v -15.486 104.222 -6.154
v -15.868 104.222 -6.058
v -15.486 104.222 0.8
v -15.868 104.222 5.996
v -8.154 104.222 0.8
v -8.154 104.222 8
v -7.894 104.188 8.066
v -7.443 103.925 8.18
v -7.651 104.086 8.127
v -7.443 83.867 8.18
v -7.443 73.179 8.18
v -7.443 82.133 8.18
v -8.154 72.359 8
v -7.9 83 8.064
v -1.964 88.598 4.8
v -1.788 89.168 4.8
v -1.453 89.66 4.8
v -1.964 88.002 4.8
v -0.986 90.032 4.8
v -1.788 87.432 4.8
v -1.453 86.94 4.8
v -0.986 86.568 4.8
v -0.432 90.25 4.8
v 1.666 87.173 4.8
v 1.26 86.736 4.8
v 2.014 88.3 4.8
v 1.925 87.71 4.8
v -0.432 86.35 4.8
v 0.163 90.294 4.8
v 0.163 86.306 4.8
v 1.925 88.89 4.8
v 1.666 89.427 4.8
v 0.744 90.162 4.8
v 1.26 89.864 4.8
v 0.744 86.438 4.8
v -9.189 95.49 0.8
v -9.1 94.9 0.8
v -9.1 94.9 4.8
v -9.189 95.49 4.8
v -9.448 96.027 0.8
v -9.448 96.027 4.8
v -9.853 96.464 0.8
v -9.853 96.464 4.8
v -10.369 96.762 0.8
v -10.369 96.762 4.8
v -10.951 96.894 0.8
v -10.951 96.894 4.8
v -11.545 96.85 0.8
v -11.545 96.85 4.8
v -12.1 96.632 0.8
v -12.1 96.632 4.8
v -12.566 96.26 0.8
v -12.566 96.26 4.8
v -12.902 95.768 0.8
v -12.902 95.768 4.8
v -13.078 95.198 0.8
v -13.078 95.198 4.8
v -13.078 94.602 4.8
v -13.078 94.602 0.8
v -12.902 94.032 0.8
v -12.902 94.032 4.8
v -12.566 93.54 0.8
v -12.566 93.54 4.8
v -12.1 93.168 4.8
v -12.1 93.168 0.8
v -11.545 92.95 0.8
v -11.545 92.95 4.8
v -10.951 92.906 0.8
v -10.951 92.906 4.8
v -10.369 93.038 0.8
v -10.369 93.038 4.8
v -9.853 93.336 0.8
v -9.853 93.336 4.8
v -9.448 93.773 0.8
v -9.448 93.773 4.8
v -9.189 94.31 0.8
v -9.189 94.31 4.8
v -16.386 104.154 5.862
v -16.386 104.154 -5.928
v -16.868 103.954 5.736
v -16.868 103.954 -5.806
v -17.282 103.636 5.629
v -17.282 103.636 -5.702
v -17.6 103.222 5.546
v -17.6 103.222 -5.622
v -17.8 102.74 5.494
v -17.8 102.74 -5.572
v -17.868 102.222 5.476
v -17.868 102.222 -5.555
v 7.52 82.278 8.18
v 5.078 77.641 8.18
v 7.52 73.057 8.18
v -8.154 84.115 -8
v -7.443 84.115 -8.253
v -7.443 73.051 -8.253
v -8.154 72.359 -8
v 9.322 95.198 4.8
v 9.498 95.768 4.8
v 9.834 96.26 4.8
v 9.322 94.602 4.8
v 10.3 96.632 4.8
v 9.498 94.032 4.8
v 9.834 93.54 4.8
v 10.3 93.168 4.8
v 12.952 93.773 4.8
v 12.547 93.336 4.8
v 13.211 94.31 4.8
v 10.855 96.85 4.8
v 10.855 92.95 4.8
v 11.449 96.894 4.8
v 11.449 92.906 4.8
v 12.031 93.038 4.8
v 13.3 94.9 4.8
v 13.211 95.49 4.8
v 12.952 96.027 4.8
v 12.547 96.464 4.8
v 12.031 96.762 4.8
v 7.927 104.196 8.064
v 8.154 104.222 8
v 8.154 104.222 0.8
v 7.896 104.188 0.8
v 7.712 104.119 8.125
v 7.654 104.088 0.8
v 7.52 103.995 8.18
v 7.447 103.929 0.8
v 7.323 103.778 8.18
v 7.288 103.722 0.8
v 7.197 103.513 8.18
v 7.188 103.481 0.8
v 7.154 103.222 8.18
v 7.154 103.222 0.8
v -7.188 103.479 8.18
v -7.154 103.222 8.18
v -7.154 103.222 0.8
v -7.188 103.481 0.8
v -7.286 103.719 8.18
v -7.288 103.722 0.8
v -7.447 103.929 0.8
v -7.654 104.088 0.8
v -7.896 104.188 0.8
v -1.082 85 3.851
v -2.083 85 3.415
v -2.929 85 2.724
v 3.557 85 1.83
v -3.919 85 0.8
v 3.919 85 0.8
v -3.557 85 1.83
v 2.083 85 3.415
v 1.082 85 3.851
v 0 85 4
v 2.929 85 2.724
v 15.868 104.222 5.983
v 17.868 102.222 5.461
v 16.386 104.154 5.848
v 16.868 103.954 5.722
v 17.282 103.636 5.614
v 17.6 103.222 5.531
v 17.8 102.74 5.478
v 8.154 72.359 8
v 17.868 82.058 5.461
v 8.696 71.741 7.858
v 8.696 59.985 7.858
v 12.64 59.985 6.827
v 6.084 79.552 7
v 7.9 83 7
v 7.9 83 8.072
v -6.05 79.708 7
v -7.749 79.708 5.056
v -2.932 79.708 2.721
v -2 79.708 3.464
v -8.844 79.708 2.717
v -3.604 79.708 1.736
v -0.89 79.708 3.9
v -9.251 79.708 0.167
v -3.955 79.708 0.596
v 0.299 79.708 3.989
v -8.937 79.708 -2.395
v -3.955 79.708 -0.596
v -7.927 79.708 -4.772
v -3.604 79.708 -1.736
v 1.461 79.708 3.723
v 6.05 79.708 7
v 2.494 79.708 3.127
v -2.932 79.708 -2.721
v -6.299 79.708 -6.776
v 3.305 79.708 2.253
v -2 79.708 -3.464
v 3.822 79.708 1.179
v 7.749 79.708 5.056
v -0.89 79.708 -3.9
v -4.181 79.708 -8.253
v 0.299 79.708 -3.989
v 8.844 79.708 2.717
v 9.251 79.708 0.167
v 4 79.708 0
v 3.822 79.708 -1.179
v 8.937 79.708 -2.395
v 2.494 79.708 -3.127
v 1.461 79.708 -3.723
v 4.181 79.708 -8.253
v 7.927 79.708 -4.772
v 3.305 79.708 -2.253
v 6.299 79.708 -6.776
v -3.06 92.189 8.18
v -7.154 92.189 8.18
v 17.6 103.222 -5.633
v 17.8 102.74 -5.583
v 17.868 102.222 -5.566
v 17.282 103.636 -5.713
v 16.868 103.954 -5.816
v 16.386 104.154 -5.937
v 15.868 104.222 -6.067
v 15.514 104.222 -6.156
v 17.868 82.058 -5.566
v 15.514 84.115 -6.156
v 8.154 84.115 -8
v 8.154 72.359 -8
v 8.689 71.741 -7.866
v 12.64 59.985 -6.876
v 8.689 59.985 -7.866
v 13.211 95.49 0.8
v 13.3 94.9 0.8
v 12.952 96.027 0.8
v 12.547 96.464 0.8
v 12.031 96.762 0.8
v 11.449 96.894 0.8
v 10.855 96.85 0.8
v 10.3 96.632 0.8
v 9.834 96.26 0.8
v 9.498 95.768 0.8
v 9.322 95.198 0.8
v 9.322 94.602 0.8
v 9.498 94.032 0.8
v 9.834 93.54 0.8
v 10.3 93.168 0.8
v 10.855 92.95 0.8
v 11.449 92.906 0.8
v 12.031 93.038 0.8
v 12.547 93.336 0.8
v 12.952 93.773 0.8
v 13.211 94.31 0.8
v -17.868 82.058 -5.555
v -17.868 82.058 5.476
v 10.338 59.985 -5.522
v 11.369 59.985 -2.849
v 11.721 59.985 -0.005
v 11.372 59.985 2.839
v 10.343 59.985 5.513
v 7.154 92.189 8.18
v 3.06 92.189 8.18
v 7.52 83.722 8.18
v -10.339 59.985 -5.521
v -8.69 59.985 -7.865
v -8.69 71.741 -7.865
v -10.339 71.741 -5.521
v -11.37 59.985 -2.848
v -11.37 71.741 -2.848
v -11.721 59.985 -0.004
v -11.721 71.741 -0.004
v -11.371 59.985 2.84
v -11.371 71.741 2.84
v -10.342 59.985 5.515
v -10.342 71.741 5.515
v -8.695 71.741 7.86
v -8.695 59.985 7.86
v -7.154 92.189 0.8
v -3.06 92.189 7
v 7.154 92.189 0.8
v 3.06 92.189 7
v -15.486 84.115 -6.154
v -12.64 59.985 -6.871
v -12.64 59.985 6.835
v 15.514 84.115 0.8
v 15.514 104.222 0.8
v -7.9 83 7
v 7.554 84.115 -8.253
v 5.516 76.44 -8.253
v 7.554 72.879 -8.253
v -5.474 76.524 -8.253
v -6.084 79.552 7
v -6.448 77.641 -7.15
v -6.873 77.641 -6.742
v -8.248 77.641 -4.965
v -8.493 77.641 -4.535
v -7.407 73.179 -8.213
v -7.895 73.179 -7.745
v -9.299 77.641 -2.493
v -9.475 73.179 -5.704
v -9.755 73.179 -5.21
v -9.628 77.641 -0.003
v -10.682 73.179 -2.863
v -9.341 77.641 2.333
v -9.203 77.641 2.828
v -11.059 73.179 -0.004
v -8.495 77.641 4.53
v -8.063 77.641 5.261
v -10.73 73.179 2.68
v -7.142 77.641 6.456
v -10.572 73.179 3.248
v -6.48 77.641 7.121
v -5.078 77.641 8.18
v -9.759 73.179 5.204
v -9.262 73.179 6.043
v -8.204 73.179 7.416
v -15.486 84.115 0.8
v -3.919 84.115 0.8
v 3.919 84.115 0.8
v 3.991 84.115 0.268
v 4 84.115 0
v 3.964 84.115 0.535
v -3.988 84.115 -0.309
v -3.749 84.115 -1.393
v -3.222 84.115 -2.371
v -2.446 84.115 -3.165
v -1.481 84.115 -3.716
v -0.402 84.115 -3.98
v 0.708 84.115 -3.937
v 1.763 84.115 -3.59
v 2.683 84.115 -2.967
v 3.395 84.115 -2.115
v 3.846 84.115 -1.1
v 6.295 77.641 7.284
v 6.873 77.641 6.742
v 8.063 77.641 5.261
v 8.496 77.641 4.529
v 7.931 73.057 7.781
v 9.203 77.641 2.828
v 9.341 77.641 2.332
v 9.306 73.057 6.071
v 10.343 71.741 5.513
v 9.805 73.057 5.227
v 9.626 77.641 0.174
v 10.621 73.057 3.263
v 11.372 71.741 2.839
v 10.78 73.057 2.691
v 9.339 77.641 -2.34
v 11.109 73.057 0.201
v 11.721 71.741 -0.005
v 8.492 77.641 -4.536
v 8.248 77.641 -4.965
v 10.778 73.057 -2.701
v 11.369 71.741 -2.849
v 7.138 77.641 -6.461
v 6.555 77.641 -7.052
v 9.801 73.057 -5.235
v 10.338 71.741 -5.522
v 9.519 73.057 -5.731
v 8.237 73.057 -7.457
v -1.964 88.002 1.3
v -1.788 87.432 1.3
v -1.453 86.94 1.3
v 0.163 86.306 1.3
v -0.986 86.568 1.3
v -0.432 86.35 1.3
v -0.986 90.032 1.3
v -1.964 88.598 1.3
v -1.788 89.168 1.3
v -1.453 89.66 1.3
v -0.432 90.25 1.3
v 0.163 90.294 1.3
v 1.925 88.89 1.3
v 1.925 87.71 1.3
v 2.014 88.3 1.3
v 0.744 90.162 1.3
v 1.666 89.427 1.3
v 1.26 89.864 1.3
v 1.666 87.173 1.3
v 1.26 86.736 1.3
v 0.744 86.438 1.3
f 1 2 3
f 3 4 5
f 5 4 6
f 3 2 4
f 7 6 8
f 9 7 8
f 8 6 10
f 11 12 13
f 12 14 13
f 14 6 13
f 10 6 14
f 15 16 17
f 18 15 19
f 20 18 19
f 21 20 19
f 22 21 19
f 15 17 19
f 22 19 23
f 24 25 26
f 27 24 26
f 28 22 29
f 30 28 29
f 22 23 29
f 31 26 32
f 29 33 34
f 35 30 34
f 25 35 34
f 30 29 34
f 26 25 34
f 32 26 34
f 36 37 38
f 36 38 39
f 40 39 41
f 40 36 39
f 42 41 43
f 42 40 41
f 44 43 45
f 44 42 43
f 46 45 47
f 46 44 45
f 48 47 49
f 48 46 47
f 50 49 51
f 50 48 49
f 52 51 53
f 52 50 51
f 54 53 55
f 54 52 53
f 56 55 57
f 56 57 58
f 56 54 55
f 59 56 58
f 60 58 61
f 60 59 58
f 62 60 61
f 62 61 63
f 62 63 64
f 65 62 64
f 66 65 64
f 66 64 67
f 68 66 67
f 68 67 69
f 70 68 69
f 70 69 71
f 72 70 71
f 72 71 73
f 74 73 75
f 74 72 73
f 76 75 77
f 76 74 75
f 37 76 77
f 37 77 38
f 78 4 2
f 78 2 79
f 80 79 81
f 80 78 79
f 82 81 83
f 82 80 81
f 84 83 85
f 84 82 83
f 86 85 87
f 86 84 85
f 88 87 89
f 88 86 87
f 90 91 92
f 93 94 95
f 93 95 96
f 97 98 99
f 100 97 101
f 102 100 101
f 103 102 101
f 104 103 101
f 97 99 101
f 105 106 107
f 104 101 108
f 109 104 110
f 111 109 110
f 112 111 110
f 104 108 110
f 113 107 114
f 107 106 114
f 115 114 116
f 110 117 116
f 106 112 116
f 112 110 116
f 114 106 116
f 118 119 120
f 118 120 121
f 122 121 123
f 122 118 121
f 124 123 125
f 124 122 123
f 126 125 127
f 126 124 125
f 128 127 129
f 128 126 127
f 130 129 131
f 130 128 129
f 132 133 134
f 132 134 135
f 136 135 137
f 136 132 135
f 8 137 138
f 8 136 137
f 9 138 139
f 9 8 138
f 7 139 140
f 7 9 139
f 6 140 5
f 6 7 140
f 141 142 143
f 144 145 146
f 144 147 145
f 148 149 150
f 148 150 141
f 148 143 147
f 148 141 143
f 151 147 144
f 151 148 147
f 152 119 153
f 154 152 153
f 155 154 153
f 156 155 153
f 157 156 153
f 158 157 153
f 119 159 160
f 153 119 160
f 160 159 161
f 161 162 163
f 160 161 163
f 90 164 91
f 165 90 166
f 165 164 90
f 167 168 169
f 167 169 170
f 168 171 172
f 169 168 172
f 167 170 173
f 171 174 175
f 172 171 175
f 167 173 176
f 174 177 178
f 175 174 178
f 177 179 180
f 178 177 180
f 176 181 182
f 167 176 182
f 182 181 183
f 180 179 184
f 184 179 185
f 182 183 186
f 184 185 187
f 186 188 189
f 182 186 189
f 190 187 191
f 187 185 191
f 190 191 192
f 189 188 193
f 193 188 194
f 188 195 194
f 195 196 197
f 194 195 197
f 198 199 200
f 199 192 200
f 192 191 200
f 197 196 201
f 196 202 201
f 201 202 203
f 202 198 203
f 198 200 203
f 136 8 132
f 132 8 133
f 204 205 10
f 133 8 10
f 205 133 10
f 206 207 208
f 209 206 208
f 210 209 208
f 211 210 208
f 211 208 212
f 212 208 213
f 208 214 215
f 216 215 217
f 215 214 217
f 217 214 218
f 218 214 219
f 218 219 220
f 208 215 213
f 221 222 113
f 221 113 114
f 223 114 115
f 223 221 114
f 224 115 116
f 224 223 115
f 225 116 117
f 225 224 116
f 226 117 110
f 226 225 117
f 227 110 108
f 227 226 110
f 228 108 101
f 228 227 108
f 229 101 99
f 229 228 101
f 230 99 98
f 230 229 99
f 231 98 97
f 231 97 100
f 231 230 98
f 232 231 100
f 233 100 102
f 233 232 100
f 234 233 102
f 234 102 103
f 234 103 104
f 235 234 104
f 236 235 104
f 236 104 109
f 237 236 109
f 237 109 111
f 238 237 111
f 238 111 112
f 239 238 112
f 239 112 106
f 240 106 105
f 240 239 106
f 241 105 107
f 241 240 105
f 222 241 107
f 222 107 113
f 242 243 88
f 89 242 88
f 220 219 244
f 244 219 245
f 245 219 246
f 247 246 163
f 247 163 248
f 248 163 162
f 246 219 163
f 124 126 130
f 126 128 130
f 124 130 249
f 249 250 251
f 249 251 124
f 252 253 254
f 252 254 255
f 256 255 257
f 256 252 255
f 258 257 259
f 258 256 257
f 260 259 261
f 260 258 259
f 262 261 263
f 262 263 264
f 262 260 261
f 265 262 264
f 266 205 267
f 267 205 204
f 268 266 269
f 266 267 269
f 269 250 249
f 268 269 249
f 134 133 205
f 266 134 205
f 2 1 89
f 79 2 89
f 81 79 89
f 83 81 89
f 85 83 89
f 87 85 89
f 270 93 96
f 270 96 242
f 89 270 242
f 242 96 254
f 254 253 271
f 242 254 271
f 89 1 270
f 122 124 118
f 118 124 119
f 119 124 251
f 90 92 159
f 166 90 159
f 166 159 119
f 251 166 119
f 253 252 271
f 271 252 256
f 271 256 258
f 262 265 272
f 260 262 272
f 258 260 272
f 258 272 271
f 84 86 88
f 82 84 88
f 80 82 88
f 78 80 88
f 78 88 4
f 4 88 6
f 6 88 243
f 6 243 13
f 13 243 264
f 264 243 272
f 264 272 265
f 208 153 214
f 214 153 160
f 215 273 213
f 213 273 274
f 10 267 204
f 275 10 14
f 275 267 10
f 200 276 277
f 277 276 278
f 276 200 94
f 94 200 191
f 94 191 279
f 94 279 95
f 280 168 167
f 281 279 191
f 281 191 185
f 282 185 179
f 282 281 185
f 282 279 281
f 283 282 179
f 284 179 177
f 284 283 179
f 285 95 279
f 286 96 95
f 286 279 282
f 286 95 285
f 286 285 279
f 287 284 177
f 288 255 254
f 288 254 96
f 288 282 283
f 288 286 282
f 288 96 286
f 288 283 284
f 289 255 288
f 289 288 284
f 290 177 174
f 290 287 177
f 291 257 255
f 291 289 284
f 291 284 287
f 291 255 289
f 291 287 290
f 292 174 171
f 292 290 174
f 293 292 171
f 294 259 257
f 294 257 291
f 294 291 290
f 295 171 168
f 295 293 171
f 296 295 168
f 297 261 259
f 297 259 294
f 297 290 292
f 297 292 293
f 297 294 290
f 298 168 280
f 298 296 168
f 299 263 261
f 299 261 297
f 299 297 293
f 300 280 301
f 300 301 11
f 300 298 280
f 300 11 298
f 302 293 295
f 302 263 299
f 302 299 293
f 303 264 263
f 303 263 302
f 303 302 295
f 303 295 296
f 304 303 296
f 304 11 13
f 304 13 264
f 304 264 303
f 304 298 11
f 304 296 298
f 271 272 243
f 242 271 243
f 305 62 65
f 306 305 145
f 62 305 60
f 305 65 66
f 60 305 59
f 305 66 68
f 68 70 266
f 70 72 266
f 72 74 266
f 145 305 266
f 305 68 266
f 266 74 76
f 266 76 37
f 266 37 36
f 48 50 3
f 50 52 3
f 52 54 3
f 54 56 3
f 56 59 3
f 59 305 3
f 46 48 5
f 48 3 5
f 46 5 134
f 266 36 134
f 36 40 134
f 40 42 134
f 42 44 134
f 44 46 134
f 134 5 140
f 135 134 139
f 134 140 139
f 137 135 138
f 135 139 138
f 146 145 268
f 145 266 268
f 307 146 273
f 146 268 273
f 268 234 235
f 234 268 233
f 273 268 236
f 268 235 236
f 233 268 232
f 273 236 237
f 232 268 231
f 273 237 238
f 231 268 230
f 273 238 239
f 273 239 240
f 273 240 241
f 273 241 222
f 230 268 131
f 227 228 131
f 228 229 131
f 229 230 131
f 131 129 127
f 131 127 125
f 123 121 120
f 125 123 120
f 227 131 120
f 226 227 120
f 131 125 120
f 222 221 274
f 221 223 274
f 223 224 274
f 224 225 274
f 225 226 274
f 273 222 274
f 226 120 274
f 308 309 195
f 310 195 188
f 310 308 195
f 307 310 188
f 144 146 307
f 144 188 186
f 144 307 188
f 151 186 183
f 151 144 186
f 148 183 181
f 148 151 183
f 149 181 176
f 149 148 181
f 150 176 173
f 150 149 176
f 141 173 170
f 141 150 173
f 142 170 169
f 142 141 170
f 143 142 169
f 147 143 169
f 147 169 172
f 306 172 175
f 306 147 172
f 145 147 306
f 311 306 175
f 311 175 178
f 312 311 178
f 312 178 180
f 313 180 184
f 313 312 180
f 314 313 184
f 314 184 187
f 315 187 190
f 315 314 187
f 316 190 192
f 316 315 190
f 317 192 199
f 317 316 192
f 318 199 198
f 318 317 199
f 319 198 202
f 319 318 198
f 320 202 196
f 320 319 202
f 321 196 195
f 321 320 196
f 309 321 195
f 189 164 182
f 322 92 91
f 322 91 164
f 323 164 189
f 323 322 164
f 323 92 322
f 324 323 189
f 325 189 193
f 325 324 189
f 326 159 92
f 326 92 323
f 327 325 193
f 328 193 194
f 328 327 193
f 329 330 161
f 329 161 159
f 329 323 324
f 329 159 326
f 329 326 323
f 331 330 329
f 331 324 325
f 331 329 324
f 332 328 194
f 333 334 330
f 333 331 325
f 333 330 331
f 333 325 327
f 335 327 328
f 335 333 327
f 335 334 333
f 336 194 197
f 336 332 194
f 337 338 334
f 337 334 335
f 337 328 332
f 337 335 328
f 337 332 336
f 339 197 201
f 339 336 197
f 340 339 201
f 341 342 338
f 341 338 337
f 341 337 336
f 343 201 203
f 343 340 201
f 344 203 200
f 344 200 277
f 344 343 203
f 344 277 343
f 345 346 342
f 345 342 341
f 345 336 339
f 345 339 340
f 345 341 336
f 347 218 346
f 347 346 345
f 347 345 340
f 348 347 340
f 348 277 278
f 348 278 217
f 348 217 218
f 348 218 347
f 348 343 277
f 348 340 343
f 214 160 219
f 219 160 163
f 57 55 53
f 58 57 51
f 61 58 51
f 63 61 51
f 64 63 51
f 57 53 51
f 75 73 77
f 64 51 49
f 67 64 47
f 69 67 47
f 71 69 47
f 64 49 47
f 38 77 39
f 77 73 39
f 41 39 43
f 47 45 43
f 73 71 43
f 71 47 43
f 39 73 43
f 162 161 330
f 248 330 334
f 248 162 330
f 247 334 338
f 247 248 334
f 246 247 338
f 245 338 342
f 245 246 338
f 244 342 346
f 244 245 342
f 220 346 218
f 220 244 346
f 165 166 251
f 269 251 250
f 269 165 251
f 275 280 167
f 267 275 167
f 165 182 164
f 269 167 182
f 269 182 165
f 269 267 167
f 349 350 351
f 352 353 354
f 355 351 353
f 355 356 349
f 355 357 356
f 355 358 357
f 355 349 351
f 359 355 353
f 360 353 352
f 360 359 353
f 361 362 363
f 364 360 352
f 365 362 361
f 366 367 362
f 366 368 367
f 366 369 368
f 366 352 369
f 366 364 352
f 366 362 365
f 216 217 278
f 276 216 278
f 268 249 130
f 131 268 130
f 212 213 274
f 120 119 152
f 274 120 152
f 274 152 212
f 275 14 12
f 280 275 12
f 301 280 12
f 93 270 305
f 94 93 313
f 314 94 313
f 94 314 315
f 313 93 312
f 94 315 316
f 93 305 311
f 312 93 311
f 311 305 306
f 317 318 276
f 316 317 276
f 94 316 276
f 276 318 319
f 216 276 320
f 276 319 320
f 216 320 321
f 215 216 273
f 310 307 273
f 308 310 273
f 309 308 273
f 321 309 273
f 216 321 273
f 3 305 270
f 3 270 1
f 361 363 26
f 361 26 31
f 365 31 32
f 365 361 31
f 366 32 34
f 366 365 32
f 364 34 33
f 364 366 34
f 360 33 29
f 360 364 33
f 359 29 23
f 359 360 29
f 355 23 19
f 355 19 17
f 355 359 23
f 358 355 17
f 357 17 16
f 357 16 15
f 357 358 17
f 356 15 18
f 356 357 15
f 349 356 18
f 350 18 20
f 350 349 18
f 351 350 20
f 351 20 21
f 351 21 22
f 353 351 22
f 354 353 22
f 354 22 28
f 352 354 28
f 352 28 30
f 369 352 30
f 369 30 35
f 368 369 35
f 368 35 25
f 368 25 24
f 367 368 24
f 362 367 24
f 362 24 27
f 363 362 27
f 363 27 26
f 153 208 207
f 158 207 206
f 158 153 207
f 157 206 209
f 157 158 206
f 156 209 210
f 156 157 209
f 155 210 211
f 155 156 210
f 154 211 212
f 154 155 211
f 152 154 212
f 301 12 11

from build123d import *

# Parameters (mm, degrees)
PAD_DEPTH       = 12
POCKET_DEPTH    = 62
SKETCH019_W     = 31
SKETCH019_H     = 21.780884
POCKET002_DEPTH = 17
SKETCH020_R     = 2
POCKET003_DEPTH = 4
CYLINDER_R      = 4
CYLINDER_DEPTH  = 28
POCKET032_DEPTH = 5
SKETCH084_W     = 7.885986
SKETCH084_H     = 7.189331
PAD020_DEPTH    = 0.5


with BuildPart() as part:
    # Sketch010 → Pad (new body, symmetric)
    with BuildSketch(Plane.XY):
        with BuildLine():
            Line((12.639868, 59.984547), (-12.639868, 59.984547))
            Line((-12.639868, 59.984547), (-17.867889, 82.058411))
            Line((-17.867889, 82.058411), (-17.867889, 102.222236))
            ThreePointArc((-15.867889, 104.222236), (-17.282103, 103.63645), (-17.867889, 102.222236))
            Line((-15.867889, 104.222236), (-8.154342, 104.222236))
            ThreePointArc((-7.154342, 103.222236), (-7.447235, 103.929343), (-8.154342, 104.222236))
            Line((-7.154342, 103.222236), (-7.154342, 92.189331))
            Line((-7.154342, 92.189331), (7.154342, 92.189331))
            Line((7.154342, 92.189331), (7.154342, 103.222236))
            ThreePointArc((8.154342, 104.222236), (7.447235, 103.929343), (7.154342, 103.222236))
            Line((8.154342, 104.222236), (15.867889, 104.222236))
            ThreePointArc((17.867889, 102.222236), (17.282103, 103.63645), (15.867889, 104.222236))
            Line((17.867889, 102.222236), (17.867889, 82.058411))
            Line((17.867889, 82.058411), (12.639868, 59.984547))
        make_face()
    extrude(amount=PAD_DEPTH, both=True)

    # Sketch011 → Pocket (cut)
    with BuildSketch(Plane.XZ.offset(-54)):
        Polygon((0, 13.813917), (-22.117895, 13.813917), (-22.117895, -0.189388), (-22.117895, -17.743416), (0, -17.743416), (22.658901, -17.743416), (22.658901, -0.111897), (22.658901, 13.813917), align=None)
        Polygon((-18.596464, 0), (-18.596464, 5.287208), (-8.154342, 8), (-7.443202, 8.179805), (0, 8.179805), (7.519913, 8.179805), (8.154342, 8), (18.531284, 5.287208), (18.531284, -0.112287), (18.531284, -5.399495), (8.154342, -8), (7.554242, -8.253323), (0.11104, -8.253323), (-7.443202, -8.253323), (-8.154342, -8), (-18.596464, -5.371119), align=None, mode=Mode.SUBTRACT)
    extrude(amount=-POCKET_DEPTH, mode=Mode.SUBTRACT)

    # Sketch019 → Pocket002 (cut)
    with BuildSketch(Plane.XY.offset(0.8)):
        with Locations((0.01352, 95.005211)):
            Rectangle(SKETCH019_W, SKETCH019_H)
    extrude(amount=-POCKET002_DEPTH, mode=Mode.SUBTRACT)

    # Sketch020 → Pocket003 (cut)
    with BuildSketch(Plane.XY.offset(0.8)):
        with Locations((-11.1, 94.9)):
            Circle(SKETCH020_R)
        with Locations((11.3, 94.9)):
            Circle(SKETCH020_R)
        with Locations((0.013518, 88.3)):
            Circle(SKETCH020_R)
    extrude(amount=POCKET003_DEPTH, mode=Mode.SUBTRACT)

    # Cylinder → Cylinder (cut)
    with BuildSketch(Plane.XZ.offset(-85)):
        Circle(CYLINDER_R)
    extrude(amount=CYLINDER_DEPTH, mode=Mode.SUBTRACT)

    # Sketch067 → Pocket032 (cut)
    with BuildSketch(Plane.XY.offset(7)):
        Polygon((-7.9, 83), (0, 68), (7.9, 83), (0, 98), align=None)
    extrude(amount=POCKET032_DEPTH, mode=Mode.SUBTRACT)

    # Sketch084 → Pad020 (join)
    with BuildSketch(Plane.XY.offset(0.8)):
        with Locations((-0.023809, 88.594665)):
            Rectangle(SKETCH084_W, SKETCH084_H)
    extrude(amount=PAD020_DEPTH)

    # Sketch085 → Groove (revolve, cut)
    with BuildSketch(Plane.XY):
        with BuildLine():
            ThreePointArc((9.252061, 79.708405), (10.164814, 75.624968), (11.720768, 71.740822))
            Line((11.720768, 71.740822), (11.720768, 58.4589))
            Line((11.720768, 58.4589), (0, 58.4589))
            Line((0, 58.4589), (0, 79.708405))
            Line((9.252061, 79.708405), (0, 79.708405))
        make_face()
    revolve(axis=Axis((0, 0, 0), (0, 1, 0)), mode=Mode.SUBTRACT)


solid = part.part
